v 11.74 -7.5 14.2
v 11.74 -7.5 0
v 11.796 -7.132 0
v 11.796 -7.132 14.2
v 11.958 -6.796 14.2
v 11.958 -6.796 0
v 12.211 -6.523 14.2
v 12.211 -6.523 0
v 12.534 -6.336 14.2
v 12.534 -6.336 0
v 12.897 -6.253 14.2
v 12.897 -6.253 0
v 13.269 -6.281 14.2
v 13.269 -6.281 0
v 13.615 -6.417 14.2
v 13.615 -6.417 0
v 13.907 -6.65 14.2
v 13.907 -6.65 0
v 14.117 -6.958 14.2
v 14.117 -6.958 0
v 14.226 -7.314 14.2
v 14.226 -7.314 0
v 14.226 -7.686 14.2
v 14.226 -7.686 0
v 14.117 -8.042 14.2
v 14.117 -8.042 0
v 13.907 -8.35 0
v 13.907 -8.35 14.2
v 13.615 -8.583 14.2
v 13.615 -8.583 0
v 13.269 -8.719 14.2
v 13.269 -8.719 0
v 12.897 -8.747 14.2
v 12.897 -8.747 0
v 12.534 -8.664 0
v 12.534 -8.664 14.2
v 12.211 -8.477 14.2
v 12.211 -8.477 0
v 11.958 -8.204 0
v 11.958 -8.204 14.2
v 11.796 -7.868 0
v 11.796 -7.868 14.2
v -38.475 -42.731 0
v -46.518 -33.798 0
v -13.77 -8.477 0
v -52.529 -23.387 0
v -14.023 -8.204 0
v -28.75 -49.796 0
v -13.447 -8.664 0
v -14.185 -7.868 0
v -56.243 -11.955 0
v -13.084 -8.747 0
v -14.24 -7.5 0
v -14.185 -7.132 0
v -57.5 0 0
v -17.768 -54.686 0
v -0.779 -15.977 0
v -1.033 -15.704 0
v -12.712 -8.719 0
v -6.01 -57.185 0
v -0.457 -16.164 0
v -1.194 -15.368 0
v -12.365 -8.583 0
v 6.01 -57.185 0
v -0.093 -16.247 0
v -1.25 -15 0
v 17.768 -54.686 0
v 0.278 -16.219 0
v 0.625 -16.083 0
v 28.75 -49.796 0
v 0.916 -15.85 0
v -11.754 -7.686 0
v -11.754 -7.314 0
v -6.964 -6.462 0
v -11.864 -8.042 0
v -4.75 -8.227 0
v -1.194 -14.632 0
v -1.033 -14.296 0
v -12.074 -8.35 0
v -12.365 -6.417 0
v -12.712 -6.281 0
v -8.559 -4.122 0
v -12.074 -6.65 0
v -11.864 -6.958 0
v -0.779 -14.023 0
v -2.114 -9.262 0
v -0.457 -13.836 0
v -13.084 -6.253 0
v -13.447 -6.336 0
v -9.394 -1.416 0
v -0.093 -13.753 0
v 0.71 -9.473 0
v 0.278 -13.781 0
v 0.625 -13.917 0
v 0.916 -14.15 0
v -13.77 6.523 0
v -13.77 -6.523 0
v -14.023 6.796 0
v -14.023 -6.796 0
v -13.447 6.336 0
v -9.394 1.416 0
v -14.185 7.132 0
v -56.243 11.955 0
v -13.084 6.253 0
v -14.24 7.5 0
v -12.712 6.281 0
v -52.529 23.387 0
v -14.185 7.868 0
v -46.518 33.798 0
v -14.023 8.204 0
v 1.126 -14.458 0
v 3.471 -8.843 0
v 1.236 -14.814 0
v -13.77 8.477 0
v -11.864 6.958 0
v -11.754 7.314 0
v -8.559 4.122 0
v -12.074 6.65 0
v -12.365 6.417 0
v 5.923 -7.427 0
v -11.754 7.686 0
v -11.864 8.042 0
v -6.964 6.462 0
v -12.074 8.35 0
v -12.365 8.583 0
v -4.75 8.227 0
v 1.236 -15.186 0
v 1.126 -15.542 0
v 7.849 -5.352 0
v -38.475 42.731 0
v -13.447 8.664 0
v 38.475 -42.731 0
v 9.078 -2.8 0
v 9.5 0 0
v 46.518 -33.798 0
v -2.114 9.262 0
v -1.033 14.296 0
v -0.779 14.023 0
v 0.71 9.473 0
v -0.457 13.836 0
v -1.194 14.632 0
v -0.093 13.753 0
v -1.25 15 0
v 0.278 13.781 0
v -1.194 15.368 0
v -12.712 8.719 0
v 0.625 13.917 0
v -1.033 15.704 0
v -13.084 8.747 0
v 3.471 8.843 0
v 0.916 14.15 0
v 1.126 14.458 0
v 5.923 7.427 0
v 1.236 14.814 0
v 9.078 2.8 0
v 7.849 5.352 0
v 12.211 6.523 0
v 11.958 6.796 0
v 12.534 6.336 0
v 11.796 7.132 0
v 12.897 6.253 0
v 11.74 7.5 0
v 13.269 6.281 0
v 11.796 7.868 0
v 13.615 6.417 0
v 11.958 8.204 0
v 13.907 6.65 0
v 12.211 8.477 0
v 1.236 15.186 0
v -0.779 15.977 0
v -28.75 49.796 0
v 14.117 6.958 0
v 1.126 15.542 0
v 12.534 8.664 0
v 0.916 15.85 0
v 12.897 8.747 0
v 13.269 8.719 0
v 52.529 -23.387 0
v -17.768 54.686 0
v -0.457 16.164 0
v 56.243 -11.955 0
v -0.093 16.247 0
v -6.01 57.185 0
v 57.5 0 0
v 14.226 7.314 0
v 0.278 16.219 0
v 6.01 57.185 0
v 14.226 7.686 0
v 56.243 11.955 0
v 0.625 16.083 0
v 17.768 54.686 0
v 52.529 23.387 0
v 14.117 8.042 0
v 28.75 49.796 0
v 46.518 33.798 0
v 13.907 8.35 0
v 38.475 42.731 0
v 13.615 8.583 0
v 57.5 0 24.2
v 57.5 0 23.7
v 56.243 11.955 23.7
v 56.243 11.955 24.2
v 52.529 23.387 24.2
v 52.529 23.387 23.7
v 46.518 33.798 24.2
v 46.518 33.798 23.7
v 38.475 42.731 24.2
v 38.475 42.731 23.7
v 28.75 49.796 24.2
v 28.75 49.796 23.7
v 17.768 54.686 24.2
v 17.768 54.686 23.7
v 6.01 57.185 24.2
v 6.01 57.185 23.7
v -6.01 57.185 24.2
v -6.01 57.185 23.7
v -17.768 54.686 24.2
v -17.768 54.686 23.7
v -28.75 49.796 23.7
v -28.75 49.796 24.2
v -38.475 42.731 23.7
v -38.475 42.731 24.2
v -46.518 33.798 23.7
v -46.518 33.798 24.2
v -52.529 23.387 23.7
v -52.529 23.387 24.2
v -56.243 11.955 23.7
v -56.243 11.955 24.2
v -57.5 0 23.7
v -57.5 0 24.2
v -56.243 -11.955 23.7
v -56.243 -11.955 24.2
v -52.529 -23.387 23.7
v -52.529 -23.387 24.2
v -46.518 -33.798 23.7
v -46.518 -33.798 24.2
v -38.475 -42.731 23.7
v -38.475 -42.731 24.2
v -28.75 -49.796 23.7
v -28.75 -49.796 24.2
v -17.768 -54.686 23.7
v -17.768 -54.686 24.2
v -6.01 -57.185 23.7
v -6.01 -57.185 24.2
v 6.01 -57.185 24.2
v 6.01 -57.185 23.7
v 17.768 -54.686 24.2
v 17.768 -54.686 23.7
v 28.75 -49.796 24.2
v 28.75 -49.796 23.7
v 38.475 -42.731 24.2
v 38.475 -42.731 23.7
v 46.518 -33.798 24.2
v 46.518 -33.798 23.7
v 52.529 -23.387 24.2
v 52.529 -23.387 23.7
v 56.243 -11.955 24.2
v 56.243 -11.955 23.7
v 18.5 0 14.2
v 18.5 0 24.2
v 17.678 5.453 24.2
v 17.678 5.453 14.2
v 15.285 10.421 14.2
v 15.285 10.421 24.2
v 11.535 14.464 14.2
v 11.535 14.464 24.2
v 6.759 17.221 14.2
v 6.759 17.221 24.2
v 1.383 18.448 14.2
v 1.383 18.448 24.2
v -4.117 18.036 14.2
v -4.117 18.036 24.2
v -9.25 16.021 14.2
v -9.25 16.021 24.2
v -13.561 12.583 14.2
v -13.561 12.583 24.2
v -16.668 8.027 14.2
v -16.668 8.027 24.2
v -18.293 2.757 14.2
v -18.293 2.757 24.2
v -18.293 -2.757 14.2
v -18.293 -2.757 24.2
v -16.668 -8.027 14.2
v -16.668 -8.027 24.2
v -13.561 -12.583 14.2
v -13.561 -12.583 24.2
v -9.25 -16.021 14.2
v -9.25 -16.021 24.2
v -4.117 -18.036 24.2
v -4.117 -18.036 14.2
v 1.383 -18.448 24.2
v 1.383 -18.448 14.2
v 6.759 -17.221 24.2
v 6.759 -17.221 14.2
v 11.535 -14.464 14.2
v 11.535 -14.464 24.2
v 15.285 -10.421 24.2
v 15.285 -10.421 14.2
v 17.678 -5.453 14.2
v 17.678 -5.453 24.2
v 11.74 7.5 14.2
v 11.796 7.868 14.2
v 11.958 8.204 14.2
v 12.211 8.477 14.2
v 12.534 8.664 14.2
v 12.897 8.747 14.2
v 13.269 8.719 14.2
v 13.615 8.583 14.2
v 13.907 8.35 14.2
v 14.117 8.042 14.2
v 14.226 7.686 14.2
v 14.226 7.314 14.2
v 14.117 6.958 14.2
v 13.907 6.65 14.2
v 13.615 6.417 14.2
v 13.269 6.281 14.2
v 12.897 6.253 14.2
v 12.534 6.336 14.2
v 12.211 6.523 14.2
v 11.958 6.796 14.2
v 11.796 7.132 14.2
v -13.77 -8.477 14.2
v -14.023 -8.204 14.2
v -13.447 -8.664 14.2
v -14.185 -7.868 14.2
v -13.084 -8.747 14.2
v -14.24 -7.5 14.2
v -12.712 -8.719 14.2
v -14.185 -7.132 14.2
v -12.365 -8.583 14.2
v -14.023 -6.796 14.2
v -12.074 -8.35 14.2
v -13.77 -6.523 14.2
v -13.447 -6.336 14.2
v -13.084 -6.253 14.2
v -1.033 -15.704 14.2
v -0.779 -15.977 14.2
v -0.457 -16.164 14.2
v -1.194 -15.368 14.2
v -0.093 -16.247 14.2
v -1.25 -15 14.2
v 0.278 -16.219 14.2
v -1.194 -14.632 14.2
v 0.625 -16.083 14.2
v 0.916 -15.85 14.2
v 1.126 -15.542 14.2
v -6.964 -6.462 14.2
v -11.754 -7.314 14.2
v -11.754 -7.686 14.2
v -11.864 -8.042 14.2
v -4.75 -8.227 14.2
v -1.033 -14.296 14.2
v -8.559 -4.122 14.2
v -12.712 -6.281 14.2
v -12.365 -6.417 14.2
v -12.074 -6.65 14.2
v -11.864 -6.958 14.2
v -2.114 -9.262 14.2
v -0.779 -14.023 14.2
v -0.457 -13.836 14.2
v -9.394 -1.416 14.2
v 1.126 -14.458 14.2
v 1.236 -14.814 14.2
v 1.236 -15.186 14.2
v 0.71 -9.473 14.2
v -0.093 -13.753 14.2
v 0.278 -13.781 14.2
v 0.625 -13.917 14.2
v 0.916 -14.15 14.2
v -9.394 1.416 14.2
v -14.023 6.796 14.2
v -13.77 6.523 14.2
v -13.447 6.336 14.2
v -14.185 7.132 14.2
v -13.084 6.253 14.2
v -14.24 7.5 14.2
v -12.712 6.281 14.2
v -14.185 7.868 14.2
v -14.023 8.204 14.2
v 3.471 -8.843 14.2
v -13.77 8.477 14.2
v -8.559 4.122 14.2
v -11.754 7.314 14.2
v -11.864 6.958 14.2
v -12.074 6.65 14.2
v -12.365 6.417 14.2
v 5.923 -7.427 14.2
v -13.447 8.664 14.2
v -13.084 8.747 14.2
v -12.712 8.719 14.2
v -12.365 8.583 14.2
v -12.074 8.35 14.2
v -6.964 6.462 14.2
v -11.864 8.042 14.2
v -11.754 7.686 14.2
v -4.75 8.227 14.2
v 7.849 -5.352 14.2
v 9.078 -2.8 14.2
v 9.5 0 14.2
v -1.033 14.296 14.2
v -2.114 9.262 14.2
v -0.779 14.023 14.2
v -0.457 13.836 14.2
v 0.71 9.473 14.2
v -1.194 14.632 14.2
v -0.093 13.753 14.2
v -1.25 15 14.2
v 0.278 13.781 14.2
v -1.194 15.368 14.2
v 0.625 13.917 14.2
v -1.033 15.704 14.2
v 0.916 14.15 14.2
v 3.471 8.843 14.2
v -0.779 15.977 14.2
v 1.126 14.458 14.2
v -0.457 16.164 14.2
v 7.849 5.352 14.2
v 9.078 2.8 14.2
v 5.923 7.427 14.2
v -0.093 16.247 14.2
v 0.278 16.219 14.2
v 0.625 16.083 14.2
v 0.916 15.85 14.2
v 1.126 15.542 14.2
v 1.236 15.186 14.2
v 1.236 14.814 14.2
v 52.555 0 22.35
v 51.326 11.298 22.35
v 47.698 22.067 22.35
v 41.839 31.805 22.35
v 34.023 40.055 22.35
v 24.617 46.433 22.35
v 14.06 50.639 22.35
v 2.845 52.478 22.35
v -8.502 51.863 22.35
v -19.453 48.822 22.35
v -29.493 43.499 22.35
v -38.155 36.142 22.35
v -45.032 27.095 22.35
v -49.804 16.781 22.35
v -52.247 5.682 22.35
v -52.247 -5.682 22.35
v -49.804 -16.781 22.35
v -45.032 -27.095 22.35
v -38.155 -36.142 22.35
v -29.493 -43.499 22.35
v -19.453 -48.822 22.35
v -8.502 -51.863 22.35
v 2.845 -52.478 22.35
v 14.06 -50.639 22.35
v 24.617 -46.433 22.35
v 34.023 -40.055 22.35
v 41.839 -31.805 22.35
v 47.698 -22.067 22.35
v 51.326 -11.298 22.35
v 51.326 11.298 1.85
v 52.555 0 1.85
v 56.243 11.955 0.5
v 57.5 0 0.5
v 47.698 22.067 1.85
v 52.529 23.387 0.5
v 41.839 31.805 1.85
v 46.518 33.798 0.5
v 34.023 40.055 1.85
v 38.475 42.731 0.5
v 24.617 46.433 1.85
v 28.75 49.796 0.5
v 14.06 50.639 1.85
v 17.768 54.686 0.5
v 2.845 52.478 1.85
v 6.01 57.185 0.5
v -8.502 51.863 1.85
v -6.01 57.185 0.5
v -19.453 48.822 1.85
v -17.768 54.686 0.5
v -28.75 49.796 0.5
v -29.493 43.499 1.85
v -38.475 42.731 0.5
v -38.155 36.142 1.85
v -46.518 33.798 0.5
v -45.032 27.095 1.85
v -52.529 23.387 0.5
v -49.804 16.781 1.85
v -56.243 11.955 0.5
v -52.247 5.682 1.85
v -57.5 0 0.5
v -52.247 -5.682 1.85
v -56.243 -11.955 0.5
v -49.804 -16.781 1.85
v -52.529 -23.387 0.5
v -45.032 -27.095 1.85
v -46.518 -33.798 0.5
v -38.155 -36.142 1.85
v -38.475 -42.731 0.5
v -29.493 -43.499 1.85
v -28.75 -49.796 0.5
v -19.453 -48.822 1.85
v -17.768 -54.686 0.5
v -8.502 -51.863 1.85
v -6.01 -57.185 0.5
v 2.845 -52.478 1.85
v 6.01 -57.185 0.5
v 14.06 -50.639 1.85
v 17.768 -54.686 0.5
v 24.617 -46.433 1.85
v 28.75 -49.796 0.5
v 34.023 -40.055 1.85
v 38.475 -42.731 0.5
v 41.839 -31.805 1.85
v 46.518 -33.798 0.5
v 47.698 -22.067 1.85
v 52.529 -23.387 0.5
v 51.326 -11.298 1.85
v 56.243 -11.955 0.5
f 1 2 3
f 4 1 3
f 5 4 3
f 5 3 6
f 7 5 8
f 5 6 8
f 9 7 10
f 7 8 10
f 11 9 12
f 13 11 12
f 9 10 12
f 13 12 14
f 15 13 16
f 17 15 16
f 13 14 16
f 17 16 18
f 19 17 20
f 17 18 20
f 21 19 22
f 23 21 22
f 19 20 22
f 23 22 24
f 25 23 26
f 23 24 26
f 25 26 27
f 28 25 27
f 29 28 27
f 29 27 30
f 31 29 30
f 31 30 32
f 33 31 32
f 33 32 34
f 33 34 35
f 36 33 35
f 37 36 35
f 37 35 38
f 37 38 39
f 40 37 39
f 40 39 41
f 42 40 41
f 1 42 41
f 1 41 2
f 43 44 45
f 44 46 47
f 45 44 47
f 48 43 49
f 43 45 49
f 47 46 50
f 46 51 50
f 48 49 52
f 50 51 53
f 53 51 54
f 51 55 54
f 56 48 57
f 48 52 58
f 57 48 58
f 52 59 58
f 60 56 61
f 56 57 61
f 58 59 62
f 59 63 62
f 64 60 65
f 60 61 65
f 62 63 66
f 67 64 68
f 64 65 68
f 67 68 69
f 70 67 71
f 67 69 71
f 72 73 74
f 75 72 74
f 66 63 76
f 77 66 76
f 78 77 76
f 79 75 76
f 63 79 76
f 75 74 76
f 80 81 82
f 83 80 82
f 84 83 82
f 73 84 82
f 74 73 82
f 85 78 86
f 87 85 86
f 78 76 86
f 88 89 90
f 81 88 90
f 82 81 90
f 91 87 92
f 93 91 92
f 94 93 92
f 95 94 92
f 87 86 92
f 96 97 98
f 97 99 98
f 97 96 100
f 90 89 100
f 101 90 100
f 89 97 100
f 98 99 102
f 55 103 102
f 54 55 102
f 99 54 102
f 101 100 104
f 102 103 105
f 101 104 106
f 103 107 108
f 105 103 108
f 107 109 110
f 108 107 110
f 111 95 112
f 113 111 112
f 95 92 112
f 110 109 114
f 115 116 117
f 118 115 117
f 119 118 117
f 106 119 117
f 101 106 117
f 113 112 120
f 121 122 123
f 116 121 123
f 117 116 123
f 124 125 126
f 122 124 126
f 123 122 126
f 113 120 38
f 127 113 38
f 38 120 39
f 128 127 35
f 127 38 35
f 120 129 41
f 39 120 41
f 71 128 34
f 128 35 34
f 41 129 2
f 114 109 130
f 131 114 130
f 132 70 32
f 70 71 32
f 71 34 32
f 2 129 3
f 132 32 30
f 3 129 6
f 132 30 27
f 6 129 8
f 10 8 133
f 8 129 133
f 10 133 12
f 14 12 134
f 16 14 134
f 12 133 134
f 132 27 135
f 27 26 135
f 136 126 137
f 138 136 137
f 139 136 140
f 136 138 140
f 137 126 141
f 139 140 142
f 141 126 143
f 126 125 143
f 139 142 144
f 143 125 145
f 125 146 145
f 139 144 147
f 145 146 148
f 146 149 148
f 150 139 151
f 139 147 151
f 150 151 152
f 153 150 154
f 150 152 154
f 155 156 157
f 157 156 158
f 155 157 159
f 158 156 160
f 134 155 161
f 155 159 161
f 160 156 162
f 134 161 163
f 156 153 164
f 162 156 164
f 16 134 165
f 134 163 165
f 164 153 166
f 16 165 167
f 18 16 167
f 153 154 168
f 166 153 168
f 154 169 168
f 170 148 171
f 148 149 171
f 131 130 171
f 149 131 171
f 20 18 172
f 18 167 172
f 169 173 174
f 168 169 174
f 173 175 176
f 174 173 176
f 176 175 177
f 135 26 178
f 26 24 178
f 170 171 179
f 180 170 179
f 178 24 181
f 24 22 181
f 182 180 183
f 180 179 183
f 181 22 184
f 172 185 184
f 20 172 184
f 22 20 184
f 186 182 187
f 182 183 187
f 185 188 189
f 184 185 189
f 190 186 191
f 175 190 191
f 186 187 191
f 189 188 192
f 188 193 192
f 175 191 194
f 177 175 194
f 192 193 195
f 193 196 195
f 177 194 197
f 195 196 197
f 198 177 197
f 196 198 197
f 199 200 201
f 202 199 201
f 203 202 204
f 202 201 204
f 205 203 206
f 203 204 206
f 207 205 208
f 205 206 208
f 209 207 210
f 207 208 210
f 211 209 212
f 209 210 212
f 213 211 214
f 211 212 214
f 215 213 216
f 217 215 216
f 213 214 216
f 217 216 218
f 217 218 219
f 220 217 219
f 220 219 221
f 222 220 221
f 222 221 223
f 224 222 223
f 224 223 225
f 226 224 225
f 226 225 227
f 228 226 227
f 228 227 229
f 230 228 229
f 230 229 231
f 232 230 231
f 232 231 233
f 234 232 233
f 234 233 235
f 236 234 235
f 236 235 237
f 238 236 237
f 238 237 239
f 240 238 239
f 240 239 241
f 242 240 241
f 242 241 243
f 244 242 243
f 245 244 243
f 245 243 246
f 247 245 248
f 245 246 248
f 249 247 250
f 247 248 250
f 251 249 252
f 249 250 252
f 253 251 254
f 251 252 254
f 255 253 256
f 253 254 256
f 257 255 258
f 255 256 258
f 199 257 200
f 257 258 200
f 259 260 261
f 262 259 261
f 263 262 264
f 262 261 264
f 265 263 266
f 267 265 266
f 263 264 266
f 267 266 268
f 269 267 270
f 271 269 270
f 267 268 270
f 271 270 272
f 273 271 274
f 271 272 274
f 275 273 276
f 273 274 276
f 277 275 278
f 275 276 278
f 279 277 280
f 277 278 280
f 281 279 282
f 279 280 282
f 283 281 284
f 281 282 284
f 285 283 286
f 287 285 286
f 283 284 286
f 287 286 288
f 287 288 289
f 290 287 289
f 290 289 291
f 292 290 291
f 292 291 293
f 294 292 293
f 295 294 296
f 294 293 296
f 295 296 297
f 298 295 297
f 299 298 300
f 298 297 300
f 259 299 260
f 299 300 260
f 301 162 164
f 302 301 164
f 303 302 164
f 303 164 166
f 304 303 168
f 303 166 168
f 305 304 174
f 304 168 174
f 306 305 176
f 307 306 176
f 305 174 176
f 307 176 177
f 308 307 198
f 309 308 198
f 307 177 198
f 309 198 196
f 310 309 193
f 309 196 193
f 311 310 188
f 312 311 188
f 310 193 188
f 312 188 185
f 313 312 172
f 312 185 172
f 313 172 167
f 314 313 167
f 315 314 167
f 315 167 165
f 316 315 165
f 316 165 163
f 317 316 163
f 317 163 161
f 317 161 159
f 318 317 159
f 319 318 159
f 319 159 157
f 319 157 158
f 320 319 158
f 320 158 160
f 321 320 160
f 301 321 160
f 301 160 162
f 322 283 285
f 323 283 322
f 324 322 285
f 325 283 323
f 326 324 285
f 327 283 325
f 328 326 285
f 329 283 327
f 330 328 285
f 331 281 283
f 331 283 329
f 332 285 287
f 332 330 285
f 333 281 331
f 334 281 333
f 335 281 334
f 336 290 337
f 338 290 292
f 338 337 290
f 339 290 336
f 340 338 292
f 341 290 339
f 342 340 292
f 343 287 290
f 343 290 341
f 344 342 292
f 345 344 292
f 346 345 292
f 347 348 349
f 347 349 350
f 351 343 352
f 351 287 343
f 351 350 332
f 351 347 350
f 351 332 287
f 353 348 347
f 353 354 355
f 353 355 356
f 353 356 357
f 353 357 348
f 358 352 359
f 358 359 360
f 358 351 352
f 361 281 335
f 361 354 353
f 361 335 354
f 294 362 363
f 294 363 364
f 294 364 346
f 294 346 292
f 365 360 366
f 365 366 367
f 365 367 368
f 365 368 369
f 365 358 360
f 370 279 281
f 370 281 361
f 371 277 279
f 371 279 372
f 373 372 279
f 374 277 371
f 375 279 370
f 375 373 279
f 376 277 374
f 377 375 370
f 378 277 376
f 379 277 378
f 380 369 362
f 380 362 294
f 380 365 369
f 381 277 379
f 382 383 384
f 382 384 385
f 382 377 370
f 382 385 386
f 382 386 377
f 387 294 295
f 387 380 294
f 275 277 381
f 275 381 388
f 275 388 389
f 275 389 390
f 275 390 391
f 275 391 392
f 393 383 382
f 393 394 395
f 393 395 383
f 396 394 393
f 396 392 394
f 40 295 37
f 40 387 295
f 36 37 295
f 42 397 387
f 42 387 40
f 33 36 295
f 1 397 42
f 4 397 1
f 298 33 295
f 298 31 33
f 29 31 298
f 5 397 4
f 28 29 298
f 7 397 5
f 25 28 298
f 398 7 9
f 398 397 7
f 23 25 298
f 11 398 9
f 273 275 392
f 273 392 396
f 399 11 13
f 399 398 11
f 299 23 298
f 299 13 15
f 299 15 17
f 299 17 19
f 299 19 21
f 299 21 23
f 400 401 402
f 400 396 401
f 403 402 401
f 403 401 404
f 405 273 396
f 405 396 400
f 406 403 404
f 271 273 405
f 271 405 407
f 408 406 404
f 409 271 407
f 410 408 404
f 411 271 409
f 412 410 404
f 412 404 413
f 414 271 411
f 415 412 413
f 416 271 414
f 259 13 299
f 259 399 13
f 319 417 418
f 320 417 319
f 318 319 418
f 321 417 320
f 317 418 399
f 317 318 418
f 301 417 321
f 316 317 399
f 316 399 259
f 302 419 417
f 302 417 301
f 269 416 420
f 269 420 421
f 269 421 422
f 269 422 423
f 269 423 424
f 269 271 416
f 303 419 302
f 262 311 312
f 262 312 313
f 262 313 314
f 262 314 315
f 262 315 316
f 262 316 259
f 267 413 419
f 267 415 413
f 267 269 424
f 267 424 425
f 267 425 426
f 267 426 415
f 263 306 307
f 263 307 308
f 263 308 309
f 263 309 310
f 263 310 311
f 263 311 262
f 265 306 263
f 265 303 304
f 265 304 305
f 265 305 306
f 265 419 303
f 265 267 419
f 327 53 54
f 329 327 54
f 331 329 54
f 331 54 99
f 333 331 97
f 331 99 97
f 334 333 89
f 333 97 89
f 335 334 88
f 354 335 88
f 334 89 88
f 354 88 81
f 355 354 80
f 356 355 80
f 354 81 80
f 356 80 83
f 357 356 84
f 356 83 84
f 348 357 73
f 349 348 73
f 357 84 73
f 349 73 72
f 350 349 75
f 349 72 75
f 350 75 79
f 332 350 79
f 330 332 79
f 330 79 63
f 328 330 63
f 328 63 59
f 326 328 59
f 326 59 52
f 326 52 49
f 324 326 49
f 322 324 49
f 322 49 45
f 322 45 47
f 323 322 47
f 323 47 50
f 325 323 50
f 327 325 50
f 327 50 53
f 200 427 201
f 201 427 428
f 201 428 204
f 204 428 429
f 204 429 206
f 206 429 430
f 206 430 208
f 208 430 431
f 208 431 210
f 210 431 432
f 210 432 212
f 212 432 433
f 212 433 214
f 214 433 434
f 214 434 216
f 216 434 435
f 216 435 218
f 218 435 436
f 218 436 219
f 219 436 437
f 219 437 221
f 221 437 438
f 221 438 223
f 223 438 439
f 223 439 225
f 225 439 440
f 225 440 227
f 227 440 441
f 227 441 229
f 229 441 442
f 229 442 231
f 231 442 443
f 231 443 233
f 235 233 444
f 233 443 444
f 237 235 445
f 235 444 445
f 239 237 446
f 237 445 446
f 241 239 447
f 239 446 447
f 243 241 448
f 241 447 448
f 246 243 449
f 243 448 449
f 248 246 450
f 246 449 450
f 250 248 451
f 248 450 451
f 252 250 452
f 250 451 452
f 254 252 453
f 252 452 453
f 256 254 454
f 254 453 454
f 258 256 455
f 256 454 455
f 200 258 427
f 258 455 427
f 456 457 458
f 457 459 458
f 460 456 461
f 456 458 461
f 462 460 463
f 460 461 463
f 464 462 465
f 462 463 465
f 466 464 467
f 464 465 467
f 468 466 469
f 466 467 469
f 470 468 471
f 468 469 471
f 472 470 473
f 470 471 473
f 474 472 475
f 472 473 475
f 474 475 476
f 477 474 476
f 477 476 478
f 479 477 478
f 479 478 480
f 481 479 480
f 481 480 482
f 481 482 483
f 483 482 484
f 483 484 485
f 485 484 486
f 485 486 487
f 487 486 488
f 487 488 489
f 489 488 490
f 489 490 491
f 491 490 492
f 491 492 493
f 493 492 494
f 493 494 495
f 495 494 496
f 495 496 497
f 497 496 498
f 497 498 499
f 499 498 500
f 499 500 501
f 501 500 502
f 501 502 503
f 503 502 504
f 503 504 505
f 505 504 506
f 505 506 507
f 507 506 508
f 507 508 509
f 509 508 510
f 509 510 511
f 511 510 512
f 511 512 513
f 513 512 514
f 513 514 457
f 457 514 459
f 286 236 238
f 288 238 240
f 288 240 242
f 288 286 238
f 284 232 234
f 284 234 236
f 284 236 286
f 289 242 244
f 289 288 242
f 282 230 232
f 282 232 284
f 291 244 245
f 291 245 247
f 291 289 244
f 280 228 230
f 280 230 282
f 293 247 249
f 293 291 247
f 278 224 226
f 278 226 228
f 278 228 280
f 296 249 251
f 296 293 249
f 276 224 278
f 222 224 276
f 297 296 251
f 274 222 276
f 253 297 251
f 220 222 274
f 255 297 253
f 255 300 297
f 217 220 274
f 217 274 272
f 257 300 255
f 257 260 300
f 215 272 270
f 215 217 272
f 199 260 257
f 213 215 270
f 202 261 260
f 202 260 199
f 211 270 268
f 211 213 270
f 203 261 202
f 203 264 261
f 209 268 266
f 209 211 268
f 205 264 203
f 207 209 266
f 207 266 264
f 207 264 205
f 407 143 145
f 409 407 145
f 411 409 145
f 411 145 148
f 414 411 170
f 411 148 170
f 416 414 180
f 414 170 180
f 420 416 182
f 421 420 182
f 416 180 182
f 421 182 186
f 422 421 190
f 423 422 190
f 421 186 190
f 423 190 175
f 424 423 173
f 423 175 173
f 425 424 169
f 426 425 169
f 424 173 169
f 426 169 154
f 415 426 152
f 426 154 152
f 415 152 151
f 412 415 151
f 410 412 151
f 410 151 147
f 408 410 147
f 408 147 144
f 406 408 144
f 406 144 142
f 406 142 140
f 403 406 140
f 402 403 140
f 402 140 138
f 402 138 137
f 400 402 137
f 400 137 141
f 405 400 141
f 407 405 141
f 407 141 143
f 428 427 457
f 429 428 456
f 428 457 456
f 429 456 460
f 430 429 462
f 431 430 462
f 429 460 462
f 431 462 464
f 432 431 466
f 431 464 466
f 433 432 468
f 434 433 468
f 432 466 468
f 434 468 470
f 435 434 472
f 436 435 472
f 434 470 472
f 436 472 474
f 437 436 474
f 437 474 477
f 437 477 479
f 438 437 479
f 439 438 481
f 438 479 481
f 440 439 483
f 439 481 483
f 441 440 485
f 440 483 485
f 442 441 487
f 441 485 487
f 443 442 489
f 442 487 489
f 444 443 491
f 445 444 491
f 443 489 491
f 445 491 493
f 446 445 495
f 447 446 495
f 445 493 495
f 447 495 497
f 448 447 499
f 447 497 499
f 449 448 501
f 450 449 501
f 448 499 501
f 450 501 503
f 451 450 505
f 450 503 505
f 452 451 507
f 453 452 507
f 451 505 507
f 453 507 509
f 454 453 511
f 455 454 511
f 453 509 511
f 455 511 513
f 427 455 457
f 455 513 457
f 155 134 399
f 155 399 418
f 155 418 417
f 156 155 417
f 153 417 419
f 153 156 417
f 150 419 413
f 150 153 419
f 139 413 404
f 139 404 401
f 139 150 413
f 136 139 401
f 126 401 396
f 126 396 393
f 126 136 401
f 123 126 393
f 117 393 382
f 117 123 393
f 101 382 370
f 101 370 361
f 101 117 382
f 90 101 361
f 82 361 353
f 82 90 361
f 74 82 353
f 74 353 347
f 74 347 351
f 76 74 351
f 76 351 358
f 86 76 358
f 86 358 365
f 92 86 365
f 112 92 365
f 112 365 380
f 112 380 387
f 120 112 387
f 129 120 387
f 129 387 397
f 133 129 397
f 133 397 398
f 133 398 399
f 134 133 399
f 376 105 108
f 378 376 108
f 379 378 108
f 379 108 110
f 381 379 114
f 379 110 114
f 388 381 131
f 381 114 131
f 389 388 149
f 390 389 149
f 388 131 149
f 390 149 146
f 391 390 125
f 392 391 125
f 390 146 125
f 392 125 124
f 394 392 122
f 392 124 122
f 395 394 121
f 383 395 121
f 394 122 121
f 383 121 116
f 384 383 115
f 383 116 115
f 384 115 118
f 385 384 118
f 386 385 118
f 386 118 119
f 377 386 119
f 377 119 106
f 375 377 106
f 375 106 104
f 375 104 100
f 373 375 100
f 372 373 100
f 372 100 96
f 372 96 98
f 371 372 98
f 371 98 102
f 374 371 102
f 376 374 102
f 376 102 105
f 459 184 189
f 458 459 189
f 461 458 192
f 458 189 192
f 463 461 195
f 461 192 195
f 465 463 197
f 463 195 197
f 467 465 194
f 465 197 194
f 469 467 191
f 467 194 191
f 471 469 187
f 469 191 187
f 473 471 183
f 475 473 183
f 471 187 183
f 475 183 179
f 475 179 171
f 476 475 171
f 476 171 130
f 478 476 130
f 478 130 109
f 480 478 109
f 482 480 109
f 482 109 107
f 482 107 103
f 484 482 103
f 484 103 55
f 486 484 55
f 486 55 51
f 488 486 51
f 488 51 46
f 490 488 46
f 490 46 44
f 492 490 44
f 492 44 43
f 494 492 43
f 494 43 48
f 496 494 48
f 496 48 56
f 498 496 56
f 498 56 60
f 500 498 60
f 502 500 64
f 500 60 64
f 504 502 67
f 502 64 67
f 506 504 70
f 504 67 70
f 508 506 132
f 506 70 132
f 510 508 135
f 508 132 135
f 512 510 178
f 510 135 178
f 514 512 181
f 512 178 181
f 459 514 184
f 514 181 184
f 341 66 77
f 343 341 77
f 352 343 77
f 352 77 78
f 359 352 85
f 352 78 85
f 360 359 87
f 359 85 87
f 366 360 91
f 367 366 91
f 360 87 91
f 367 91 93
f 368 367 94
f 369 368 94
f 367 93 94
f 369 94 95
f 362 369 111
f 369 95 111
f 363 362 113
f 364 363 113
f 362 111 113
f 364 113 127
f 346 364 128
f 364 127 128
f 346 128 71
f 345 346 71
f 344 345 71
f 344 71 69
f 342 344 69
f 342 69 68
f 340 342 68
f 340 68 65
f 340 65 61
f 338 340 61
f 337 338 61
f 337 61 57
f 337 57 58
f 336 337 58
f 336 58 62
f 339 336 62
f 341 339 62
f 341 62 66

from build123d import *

# Parameters (mm, degrees)
SKETCH_1_R          = 57.5
SKETCH_1_R_2        = 9.5
EXTRUDE_1_DEPTH     = 24.2
SKETCH_3_R          = 18.5
SKETCH_3_R_2        = 9.5
CUT_EXTRUDE_2_DEPTH = 10
SKETCH_4_R          = 1.25
CUT_EXTRUDE_3_DEPTH = 25.2


with BuildPart() as part:
    # 草圖1 → 填料-伸長1 (new body)
    with BuildSketch(Plane.XY):
        Circle(SKETCH_1_R)
        Circle(SKETCH_1_R_2, mode=Mode.SUBTRACT)
    extrude(amount=EXTRUDE_1_DEPTH)

    # 草圖3 → 除料-伸長2 (cut)
    with BuildSketch(Plane.XY.offset(24.2)):
        Circle(SKETCH_3_R)
        Circle(SKETCH_3_R_2, mode=Mode.SUBTRACT)
    extrude(amount=-CUT_EXTRUDE_2_DEPTH, mode=Mode.SUBTRACT)

    # 草圖4 → 除料-伸長3 (cut, through all)
    with BuildSketch(Plane(origin=(0, 0, 0), x_dir=(-1, 0, 0), z_dir=(0, 0, -1))):
        with Locations((0, 15)):
            Circle(SKETCH_4_R)
        with Locations((12.990381057, -7.5)):
            Circle(SKETCH_4_R)
        with Locations((-12.990381057, -7.5)):
            Circle(SKETCH_4_R)
        with Locations((12.990381057, 7.5)):
            Circle(SKETCH_4_R)
        with Locations((0, -15)):
            Circle(SKETCH_4_R)
        with Locations((-12.990381057, 7.5)):
            Circle(SKETCH_4_R)
    extrude(amount=-CUT_EXTRUDE_3_DEPTH, mode=Mode.SUBTRACT)

    # 草圖5 → 除料-旋轉1 (revolve, cut)
    with BuildSketch(Plane(origin=(0, 0, 0), x_dir=(1, 0, 0), z_dir=(0, 1, 0))):
        Polygon((57.5, -23.7), (52.555, -22.35), (52.555, -1.85), (57.5, -0.5), align=None)
    revolve(axis=Axis((0, 0, 0), (0, 0, 1)), mode=Mode.SUBTRACT)


solid = part.part
